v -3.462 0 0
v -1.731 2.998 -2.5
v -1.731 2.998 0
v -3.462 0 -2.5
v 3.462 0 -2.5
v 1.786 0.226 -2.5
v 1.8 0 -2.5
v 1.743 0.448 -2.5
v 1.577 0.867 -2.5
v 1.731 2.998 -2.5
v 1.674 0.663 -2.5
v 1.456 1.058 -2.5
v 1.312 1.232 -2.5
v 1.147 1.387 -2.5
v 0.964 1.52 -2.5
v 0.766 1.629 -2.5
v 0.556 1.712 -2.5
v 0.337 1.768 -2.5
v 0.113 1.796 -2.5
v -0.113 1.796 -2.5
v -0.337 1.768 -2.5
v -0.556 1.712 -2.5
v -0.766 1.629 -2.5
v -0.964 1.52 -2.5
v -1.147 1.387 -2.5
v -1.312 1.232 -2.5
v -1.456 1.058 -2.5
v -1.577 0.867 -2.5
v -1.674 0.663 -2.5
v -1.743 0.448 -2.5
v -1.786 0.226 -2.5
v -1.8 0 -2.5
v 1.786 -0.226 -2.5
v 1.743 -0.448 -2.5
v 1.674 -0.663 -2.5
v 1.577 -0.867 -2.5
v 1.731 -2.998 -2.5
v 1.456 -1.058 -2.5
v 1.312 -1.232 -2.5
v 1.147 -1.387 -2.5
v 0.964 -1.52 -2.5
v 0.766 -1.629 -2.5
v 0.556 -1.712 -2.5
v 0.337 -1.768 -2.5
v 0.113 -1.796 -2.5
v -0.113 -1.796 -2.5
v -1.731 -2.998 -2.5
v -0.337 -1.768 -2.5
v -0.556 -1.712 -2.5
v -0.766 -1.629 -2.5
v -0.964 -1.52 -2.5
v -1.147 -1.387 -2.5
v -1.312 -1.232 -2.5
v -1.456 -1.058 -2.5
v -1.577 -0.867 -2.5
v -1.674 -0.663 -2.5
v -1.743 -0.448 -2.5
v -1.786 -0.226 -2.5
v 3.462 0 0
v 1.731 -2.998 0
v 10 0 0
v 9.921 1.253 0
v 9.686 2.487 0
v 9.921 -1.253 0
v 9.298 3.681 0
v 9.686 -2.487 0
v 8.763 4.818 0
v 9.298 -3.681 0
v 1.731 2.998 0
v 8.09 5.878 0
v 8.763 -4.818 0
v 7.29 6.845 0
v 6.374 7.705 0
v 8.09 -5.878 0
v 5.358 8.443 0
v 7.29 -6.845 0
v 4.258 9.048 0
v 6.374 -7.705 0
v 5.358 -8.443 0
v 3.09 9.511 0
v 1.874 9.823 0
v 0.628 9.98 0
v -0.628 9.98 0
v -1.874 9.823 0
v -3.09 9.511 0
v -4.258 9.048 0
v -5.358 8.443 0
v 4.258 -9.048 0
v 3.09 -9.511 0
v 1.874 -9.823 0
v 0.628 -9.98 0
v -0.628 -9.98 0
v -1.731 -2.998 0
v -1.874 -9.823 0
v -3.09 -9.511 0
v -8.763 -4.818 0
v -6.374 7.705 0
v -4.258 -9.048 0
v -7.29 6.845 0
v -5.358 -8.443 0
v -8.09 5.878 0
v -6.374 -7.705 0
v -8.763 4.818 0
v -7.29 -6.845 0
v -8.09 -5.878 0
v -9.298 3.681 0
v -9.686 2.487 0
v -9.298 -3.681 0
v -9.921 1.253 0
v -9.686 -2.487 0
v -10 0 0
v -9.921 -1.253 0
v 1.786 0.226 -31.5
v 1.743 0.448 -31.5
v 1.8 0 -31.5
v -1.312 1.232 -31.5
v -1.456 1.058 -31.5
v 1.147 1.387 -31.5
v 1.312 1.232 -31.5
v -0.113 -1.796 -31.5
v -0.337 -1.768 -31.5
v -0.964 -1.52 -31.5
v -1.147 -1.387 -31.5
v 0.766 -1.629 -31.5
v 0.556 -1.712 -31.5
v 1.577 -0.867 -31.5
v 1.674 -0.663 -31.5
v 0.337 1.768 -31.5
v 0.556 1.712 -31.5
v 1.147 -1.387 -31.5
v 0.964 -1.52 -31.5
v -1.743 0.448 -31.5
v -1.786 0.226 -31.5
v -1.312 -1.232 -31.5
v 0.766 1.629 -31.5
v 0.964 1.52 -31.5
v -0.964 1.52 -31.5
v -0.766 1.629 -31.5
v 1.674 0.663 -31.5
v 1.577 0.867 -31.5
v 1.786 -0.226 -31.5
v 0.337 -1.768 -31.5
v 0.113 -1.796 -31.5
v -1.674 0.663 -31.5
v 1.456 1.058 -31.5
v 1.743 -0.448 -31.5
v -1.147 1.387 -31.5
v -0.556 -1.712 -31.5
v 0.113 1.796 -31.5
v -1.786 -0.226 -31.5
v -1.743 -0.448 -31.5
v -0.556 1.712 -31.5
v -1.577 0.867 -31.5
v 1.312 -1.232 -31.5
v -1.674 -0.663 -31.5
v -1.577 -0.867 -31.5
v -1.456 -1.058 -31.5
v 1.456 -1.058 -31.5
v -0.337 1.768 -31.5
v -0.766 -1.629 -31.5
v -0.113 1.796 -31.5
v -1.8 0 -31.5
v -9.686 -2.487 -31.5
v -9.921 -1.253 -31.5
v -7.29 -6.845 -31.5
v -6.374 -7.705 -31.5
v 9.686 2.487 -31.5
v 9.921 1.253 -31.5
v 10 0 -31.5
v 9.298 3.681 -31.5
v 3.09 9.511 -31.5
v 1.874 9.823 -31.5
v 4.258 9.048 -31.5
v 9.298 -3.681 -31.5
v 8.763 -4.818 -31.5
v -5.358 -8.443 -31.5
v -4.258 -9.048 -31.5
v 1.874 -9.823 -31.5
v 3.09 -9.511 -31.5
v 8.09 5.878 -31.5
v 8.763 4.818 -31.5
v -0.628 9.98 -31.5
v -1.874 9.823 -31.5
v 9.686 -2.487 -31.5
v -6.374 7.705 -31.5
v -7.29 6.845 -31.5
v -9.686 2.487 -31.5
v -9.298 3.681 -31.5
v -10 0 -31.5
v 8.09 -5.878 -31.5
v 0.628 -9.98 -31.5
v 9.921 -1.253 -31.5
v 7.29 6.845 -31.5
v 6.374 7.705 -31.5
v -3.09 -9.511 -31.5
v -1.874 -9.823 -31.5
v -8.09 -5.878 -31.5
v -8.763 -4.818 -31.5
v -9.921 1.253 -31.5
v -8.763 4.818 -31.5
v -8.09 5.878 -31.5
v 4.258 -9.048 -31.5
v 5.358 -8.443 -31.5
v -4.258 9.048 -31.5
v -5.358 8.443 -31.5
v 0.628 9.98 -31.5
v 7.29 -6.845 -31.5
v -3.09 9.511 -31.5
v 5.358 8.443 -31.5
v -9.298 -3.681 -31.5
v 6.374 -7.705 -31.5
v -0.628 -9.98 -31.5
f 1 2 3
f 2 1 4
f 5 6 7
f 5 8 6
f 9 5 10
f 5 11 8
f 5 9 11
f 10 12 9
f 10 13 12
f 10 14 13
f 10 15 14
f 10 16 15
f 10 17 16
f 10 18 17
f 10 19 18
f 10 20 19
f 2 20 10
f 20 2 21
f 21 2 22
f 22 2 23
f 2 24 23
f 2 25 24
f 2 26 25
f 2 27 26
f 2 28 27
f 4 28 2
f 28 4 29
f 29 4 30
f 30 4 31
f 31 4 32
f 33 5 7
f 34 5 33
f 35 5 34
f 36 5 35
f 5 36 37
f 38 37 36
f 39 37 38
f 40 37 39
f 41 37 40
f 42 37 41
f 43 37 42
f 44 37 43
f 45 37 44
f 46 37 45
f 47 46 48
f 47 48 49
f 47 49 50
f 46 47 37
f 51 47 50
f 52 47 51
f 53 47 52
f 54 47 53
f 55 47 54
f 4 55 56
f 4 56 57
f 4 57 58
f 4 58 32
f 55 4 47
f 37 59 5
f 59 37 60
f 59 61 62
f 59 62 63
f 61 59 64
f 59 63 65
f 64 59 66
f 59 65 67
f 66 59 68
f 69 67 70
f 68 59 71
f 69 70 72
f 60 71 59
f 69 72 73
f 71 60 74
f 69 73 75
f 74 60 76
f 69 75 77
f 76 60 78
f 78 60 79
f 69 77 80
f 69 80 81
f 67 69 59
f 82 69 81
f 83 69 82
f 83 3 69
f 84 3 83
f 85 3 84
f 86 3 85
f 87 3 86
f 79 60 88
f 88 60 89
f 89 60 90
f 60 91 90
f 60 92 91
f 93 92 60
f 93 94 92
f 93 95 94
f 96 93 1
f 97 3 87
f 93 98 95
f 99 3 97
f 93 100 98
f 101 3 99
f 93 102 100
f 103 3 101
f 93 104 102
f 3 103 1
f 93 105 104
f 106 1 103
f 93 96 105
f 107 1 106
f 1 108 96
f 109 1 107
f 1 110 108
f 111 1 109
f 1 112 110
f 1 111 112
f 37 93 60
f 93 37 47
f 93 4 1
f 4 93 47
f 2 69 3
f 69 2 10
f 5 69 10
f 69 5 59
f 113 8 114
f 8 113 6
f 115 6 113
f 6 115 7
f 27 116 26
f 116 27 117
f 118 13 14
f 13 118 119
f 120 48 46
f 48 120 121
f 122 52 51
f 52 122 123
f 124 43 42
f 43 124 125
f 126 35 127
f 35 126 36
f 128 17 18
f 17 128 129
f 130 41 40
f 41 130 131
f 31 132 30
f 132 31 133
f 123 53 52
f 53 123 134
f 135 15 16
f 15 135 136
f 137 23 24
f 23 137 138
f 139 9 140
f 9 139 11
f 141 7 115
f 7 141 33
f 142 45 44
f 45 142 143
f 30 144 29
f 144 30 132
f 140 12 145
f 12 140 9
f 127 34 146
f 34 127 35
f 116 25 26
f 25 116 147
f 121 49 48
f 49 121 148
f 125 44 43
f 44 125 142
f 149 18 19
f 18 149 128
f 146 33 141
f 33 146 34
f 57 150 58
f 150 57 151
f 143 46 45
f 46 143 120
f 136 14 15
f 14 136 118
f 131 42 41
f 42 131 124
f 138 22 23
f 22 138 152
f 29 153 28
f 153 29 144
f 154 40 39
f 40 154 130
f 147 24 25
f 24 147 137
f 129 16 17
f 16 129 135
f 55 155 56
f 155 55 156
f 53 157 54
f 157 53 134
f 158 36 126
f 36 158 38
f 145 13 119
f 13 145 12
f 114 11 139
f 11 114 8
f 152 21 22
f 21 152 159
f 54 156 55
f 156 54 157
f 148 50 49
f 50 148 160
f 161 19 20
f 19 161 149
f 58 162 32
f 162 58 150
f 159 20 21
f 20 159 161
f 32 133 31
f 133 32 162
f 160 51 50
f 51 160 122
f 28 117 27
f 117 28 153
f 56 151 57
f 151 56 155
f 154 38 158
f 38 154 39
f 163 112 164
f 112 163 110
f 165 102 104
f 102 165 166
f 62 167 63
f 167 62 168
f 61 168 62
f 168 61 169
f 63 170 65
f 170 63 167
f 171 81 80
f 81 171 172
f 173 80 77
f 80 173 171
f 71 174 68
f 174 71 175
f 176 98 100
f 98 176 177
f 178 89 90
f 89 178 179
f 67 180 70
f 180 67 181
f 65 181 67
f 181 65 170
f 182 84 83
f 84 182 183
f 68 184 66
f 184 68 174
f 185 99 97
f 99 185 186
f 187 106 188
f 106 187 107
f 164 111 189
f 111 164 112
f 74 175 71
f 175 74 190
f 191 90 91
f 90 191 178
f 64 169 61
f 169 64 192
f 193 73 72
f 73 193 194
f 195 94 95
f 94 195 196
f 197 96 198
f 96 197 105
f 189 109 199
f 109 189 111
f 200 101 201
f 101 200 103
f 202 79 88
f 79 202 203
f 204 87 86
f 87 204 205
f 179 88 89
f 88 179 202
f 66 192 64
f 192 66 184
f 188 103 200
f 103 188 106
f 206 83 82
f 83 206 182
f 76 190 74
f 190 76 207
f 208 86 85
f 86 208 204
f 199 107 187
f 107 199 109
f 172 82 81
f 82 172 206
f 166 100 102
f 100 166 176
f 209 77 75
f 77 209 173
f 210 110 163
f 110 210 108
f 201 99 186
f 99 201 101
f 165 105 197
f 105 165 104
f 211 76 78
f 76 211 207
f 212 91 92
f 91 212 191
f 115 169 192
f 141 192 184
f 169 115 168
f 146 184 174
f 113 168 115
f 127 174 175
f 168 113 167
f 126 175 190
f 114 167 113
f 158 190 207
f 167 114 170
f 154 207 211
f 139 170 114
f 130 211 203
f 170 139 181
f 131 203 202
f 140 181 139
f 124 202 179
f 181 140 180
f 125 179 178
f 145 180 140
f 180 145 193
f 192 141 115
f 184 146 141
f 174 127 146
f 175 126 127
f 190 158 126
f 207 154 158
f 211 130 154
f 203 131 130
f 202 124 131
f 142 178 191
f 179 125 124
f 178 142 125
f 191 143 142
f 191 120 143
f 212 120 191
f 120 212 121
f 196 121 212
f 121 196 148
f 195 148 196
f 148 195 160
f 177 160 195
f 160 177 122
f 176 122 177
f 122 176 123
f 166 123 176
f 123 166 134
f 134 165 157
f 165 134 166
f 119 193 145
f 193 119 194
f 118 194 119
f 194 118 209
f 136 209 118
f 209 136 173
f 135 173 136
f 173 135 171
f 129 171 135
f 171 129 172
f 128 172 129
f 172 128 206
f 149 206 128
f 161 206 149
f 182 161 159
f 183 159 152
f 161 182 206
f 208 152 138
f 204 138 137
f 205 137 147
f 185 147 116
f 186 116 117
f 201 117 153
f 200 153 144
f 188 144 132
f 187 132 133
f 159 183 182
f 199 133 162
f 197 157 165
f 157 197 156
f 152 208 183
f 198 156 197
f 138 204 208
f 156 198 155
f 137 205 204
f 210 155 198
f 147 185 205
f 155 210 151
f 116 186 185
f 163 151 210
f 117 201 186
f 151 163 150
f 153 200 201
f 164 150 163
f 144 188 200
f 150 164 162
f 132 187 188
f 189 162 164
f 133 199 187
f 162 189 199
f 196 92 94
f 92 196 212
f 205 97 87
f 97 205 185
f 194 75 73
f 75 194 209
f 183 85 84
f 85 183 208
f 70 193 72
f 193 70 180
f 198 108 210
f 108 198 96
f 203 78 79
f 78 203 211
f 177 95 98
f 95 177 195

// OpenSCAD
$fn = 50;

difference() {
	union() {
		translate(v = [0, 0, -31.5]) {
			cylinder(h = 31.5, r = 10.0);
		}
	}
	union() {
		translate(v = [0, 0, 0]) {
			rotate(a = [0, 0, 0]) {
				difference() {
					union() {
						translate(v = [0, 0, -2.5]) {
							linear_extrude(height = 2.5) {
								polygon(points = [[3.4619999999999997, 0.0], [1.7310000000000003, 2.9981799479017264], [-1.7309999999999992, 2.9981799479017264], [-3.4619999999999997, 4.2397272186481365e-16], [-1.7310000000000014, -2.998179947901726], [1.7309999999999977, -2.9981799479017277]]);
							}
						}
					}
					union();
				}
			}
		}
		#translate(v = [0, 0, -100.0]) {
			cylinder(h = 200, r = 1.8);
		}
	}
}
